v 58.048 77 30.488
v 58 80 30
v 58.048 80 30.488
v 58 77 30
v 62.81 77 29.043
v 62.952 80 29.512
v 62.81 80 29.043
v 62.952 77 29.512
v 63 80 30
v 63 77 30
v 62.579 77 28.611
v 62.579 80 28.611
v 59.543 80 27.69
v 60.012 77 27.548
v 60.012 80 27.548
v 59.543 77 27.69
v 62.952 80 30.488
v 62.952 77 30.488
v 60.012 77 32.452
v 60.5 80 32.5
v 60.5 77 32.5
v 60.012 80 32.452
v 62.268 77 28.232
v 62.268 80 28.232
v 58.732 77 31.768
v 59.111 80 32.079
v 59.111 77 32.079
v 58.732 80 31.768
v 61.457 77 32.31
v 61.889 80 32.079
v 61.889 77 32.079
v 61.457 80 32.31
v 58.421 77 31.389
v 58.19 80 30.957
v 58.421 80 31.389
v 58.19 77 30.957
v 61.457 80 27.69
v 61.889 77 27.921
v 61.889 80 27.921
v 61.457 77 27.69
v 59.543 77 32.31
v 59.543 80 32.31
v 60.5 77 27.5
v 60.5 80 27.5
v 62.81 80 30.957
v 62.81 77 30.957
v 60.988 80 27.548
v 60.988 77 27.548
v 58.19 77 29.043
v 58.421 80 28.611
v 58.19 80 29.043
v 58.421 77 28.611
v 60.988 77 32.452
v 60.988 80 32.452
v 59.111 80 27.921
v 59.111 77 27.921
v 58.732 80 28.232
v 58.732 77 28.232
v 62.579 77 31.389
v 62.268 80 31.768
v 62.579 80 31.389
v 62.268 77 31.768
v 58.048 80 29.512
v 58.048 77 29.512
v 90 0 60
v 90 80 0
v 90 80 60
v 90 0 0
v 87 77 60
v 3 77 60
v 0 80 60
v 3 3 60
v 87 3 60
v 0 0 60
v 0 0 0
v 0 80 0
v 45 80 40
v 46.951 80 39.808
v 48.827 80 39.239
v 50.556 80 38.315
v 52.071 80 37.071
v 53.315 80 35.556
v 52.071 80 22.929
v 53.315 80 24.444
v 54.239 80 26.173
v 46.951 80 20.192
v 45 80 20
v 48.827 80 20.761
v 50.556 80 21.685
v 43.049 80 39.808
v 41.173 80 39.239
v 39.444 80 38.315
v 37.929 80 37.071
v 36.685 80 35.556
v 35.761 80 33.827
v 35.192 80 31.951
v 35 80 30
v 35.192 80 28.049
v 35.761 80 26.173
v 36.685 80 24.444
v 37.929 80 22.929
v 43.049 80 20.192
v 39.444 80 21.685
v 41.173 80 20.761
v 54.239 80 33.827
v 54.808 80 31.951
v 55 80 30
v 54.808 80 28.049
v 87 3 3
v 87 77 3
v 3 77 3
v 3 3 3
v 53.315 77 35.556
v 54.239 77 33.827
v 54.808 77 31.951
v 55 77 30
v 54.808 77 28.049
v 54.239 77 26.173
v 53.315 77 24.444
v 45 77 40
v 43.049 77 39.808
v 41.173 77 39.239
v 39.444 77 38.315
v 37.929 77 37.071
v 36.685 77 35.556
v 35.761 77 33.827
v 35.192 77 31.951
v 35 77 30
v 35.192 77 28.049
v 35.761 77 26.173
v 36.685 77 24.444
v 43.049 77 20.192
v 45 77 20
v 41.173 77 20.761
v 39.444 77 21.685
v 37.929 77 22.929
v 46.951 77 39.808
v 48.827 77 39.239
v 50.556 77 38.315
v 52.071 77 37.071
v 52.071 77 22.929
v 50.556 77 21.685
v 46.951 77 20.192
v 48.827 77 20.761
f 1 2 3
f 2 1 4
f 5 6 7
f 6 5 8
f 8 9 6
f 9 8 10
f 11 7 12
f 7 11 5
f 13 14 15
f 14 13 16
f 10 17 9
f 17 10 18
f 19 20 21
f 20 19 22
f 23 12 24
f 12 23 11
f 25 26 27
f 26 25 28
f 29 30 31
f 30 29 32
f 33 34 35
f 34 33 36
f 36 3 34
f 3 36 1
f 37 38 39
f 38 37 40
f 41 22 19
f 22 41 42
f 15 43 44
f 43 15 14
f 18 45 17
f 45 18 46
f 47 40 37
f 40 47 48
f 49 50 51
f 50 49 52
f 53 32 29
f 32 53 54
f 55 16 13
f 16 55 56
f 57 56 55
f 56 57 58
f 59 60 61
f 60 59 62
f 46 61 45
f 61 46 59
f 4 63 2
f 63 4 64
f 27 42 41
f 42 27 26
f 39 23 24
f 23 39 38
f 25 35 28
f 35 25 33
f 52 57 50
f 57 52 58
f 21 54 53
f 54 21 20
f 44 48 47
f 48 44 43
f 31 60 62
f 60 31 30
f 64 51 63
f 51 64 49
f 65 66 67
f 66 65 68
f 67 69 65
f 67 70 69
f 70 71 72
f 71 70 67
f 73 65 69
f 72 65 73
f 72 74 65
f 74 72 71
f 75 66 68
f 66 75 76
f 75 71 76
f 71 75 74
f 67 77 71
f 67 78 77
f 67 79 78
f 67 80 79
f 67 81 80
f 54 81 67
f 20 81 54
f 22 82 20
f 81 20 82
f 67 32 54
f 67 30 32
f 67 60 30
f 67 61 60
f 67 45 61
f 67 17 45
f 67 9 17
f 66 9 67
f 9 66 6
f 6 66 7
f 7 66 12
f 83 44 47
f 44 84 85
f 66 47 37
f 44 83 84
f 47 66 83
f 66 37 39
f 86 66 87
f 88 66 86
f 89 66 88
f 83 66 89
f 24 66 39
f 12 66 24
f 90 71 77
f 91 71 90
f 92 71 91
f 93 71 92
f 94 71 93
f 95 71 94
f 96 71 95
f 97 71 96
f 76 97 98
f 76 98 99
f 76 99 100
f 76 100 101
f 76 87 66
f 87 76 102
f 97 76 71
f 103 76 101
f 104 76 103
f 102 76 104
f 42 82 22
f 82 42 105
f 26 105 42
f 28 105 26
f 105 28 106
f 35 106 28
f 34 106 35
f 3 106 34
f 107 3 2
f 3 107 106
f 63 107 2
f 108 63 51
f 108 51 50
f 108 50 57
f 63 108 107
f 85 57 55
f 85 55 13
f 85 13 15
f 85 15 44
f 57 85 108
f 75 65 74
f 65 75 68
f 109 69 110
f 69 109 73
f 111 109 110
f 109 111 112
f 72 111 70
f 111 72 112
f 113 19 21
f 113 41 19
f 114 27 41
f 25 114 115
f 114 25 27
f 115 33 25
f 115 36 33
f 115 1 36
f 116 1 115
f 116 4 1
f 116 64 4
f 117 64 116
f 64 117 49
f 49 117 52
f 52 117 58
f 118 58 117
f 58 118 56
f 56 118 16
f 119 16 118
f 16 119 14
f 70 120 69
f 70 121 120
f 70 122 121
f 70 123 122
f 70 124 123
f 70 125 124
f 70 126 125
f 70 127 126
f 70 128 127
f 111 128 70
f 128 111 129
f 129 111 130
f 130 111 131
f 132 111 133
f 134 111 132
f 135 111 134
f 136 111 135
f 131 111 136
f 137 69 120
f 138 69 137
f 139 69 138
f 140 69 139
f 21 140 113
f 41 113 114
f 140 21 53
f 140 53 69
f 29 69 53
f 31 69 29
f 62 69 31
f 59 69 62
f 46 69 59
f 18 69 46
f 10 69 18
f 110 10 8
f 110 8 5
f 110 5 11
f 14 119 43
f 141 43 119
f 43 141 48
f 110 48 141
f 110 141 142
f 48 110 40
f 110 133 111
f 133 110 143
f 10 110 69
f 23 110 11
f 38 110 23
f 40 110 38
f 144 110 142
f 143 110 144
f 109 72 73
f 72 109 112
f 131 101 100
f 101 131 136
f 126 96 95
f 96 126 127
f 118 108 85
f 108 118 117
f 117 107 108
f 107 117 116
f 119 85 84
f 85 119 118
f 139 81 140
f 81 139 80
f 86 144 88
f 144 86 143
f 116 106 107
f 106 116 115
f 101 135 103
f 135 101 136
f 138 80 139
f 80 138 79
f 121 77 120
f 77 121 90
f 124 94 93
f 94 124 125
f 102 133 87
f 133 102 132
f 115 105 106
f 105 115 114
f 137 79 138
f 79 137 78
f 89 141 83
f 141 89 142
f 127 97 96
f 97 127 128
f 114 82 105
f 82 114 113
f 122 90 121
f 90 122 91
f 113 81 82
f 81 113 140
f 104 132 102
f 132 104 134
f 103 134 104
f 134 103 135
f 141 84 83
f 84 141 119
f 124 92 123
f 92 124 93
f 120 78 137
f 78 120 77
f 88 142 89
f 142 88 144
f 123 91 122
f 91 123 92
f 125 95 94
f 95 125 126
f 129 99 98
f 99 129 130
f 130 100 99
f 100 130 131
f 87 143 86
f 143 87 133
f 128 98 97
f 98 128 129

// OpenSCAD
$fn = 32;

// ----------------------------------------------------------------------
// Vent box: roundvent enclosure
// ----------------------------------------------------------------------

// --- parameters (mm) ---
box_l = 90;               // box length, X
box_w = 80;               // box width, Y
box_h = 60;               // box height, Z
wall_t = 3;               // shell wall thickness
vent_d = 20;              // central vent diameter
ring_d = 5;               // ring hole diameter
n_ring = 6;               // holes in the ring
ring_r = 15.5;            // ring radius

ring_step = 360 / n_ring;  // ring hole angular step

difference() {
  cube([box_l, box_w, box_h]);
  translate([wall_t, wall_t, wall_t])
    cube([box_l - 2 * wall_t, box_w - 2 * wall_t, box_h]);
  translate([box_l / 2, box_w - wall_t - 1, box_h / 2])
    rotate([-90, 0, 0]) cylinder(h = wall_t + 2, d = vent_d);
  for (i = [0 : n_ring - 1])
    translate([box_l / 2, box_w - wall_t - 1, box_h / 2])
      rotate([0, 0, i * ring_step])
        translate([ring_r, 0, 0]) rotate([-90, 0, 0])
          cylinder(h = wall_t + 2, d = ring_d);
}
